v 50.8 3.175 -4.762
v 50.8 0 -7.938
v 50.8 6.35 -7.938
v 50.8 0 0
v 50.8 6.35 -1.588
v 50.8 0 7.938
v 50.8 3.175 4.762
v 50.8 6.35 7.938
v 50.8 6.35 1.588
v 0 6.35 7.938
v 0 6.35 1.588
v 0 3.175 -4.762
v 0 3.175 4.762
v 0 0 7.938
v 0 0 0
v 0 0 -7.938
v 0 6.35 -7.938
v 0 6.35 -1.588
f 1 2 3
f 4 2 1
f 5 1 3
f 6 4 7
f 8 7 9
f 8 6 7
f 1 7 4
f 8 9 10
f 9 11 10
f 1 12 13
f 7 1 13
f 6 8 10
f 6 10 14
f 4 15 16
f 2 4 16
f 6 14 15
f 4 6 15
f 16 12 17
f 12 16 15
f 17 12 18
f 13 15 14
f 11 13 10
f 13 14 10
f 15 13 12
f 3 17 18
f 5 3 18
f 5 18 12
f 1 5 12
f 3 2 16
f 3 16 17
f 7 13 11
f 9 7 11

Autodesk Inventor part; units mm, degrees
ref_plane "YZ Plane" through (0, 0, 0) normal (1, 0, 0) x (0, 1, 0)
ref_plane "XZ Plane" through (0, 0, 0) normal (0, 1, 0) x (-1, 0, 0)
ref_plane "XY Plane" through (0, 0, 0) normal (0, 0, 1) x (1, 0, 0)
sketch "Sketch1" plane through (0, 0, 0) normal (1, 0, 0) x (0, 1, 0)
  line L0 (0, 0) -> (0, -7.9375)
  line L1 (0, -7.9375) -> (6.35, -7.9375)
  line L2 (6.35, -7.9375) -> (6.35, -1.5875)
  line L3 (6.35, -1.5875) -> (3.175, -4.7625)
  line L4 (3.175, -4.7625) -> (3.175, 4.7625)
  line L5 (3.175, 4.7625) -> (6.35, 1.5875)
  line L6 (6.35, 1.5875) -> (6.35, 7.9375)
  line L7 (6.35, 7.9375) -> (0, 7.9375)
  line L8 (0, 7.9375) -> (0, 0)
  dimension "d0" = 7.9375
  dimension "d1" = 7.9375
  dimension "d2" = 6.35
  dimension "d3" = 6.35
  dimension "d4" = 6.35
  dimension "d5" = 6.35
  dimension "d6" = 9.525
  dimension "d7" = 45
  dimension "d8" = 45
extrude "Extrusion1" add sketch "Sketch1" along normal blind 50.8
sketch "Sketch2" plane through (0, 0, -7.9375) normal (0, 0, -1) x (-1, 0, 0)
  point P0 (0, 0)
properties part number "Test2"
